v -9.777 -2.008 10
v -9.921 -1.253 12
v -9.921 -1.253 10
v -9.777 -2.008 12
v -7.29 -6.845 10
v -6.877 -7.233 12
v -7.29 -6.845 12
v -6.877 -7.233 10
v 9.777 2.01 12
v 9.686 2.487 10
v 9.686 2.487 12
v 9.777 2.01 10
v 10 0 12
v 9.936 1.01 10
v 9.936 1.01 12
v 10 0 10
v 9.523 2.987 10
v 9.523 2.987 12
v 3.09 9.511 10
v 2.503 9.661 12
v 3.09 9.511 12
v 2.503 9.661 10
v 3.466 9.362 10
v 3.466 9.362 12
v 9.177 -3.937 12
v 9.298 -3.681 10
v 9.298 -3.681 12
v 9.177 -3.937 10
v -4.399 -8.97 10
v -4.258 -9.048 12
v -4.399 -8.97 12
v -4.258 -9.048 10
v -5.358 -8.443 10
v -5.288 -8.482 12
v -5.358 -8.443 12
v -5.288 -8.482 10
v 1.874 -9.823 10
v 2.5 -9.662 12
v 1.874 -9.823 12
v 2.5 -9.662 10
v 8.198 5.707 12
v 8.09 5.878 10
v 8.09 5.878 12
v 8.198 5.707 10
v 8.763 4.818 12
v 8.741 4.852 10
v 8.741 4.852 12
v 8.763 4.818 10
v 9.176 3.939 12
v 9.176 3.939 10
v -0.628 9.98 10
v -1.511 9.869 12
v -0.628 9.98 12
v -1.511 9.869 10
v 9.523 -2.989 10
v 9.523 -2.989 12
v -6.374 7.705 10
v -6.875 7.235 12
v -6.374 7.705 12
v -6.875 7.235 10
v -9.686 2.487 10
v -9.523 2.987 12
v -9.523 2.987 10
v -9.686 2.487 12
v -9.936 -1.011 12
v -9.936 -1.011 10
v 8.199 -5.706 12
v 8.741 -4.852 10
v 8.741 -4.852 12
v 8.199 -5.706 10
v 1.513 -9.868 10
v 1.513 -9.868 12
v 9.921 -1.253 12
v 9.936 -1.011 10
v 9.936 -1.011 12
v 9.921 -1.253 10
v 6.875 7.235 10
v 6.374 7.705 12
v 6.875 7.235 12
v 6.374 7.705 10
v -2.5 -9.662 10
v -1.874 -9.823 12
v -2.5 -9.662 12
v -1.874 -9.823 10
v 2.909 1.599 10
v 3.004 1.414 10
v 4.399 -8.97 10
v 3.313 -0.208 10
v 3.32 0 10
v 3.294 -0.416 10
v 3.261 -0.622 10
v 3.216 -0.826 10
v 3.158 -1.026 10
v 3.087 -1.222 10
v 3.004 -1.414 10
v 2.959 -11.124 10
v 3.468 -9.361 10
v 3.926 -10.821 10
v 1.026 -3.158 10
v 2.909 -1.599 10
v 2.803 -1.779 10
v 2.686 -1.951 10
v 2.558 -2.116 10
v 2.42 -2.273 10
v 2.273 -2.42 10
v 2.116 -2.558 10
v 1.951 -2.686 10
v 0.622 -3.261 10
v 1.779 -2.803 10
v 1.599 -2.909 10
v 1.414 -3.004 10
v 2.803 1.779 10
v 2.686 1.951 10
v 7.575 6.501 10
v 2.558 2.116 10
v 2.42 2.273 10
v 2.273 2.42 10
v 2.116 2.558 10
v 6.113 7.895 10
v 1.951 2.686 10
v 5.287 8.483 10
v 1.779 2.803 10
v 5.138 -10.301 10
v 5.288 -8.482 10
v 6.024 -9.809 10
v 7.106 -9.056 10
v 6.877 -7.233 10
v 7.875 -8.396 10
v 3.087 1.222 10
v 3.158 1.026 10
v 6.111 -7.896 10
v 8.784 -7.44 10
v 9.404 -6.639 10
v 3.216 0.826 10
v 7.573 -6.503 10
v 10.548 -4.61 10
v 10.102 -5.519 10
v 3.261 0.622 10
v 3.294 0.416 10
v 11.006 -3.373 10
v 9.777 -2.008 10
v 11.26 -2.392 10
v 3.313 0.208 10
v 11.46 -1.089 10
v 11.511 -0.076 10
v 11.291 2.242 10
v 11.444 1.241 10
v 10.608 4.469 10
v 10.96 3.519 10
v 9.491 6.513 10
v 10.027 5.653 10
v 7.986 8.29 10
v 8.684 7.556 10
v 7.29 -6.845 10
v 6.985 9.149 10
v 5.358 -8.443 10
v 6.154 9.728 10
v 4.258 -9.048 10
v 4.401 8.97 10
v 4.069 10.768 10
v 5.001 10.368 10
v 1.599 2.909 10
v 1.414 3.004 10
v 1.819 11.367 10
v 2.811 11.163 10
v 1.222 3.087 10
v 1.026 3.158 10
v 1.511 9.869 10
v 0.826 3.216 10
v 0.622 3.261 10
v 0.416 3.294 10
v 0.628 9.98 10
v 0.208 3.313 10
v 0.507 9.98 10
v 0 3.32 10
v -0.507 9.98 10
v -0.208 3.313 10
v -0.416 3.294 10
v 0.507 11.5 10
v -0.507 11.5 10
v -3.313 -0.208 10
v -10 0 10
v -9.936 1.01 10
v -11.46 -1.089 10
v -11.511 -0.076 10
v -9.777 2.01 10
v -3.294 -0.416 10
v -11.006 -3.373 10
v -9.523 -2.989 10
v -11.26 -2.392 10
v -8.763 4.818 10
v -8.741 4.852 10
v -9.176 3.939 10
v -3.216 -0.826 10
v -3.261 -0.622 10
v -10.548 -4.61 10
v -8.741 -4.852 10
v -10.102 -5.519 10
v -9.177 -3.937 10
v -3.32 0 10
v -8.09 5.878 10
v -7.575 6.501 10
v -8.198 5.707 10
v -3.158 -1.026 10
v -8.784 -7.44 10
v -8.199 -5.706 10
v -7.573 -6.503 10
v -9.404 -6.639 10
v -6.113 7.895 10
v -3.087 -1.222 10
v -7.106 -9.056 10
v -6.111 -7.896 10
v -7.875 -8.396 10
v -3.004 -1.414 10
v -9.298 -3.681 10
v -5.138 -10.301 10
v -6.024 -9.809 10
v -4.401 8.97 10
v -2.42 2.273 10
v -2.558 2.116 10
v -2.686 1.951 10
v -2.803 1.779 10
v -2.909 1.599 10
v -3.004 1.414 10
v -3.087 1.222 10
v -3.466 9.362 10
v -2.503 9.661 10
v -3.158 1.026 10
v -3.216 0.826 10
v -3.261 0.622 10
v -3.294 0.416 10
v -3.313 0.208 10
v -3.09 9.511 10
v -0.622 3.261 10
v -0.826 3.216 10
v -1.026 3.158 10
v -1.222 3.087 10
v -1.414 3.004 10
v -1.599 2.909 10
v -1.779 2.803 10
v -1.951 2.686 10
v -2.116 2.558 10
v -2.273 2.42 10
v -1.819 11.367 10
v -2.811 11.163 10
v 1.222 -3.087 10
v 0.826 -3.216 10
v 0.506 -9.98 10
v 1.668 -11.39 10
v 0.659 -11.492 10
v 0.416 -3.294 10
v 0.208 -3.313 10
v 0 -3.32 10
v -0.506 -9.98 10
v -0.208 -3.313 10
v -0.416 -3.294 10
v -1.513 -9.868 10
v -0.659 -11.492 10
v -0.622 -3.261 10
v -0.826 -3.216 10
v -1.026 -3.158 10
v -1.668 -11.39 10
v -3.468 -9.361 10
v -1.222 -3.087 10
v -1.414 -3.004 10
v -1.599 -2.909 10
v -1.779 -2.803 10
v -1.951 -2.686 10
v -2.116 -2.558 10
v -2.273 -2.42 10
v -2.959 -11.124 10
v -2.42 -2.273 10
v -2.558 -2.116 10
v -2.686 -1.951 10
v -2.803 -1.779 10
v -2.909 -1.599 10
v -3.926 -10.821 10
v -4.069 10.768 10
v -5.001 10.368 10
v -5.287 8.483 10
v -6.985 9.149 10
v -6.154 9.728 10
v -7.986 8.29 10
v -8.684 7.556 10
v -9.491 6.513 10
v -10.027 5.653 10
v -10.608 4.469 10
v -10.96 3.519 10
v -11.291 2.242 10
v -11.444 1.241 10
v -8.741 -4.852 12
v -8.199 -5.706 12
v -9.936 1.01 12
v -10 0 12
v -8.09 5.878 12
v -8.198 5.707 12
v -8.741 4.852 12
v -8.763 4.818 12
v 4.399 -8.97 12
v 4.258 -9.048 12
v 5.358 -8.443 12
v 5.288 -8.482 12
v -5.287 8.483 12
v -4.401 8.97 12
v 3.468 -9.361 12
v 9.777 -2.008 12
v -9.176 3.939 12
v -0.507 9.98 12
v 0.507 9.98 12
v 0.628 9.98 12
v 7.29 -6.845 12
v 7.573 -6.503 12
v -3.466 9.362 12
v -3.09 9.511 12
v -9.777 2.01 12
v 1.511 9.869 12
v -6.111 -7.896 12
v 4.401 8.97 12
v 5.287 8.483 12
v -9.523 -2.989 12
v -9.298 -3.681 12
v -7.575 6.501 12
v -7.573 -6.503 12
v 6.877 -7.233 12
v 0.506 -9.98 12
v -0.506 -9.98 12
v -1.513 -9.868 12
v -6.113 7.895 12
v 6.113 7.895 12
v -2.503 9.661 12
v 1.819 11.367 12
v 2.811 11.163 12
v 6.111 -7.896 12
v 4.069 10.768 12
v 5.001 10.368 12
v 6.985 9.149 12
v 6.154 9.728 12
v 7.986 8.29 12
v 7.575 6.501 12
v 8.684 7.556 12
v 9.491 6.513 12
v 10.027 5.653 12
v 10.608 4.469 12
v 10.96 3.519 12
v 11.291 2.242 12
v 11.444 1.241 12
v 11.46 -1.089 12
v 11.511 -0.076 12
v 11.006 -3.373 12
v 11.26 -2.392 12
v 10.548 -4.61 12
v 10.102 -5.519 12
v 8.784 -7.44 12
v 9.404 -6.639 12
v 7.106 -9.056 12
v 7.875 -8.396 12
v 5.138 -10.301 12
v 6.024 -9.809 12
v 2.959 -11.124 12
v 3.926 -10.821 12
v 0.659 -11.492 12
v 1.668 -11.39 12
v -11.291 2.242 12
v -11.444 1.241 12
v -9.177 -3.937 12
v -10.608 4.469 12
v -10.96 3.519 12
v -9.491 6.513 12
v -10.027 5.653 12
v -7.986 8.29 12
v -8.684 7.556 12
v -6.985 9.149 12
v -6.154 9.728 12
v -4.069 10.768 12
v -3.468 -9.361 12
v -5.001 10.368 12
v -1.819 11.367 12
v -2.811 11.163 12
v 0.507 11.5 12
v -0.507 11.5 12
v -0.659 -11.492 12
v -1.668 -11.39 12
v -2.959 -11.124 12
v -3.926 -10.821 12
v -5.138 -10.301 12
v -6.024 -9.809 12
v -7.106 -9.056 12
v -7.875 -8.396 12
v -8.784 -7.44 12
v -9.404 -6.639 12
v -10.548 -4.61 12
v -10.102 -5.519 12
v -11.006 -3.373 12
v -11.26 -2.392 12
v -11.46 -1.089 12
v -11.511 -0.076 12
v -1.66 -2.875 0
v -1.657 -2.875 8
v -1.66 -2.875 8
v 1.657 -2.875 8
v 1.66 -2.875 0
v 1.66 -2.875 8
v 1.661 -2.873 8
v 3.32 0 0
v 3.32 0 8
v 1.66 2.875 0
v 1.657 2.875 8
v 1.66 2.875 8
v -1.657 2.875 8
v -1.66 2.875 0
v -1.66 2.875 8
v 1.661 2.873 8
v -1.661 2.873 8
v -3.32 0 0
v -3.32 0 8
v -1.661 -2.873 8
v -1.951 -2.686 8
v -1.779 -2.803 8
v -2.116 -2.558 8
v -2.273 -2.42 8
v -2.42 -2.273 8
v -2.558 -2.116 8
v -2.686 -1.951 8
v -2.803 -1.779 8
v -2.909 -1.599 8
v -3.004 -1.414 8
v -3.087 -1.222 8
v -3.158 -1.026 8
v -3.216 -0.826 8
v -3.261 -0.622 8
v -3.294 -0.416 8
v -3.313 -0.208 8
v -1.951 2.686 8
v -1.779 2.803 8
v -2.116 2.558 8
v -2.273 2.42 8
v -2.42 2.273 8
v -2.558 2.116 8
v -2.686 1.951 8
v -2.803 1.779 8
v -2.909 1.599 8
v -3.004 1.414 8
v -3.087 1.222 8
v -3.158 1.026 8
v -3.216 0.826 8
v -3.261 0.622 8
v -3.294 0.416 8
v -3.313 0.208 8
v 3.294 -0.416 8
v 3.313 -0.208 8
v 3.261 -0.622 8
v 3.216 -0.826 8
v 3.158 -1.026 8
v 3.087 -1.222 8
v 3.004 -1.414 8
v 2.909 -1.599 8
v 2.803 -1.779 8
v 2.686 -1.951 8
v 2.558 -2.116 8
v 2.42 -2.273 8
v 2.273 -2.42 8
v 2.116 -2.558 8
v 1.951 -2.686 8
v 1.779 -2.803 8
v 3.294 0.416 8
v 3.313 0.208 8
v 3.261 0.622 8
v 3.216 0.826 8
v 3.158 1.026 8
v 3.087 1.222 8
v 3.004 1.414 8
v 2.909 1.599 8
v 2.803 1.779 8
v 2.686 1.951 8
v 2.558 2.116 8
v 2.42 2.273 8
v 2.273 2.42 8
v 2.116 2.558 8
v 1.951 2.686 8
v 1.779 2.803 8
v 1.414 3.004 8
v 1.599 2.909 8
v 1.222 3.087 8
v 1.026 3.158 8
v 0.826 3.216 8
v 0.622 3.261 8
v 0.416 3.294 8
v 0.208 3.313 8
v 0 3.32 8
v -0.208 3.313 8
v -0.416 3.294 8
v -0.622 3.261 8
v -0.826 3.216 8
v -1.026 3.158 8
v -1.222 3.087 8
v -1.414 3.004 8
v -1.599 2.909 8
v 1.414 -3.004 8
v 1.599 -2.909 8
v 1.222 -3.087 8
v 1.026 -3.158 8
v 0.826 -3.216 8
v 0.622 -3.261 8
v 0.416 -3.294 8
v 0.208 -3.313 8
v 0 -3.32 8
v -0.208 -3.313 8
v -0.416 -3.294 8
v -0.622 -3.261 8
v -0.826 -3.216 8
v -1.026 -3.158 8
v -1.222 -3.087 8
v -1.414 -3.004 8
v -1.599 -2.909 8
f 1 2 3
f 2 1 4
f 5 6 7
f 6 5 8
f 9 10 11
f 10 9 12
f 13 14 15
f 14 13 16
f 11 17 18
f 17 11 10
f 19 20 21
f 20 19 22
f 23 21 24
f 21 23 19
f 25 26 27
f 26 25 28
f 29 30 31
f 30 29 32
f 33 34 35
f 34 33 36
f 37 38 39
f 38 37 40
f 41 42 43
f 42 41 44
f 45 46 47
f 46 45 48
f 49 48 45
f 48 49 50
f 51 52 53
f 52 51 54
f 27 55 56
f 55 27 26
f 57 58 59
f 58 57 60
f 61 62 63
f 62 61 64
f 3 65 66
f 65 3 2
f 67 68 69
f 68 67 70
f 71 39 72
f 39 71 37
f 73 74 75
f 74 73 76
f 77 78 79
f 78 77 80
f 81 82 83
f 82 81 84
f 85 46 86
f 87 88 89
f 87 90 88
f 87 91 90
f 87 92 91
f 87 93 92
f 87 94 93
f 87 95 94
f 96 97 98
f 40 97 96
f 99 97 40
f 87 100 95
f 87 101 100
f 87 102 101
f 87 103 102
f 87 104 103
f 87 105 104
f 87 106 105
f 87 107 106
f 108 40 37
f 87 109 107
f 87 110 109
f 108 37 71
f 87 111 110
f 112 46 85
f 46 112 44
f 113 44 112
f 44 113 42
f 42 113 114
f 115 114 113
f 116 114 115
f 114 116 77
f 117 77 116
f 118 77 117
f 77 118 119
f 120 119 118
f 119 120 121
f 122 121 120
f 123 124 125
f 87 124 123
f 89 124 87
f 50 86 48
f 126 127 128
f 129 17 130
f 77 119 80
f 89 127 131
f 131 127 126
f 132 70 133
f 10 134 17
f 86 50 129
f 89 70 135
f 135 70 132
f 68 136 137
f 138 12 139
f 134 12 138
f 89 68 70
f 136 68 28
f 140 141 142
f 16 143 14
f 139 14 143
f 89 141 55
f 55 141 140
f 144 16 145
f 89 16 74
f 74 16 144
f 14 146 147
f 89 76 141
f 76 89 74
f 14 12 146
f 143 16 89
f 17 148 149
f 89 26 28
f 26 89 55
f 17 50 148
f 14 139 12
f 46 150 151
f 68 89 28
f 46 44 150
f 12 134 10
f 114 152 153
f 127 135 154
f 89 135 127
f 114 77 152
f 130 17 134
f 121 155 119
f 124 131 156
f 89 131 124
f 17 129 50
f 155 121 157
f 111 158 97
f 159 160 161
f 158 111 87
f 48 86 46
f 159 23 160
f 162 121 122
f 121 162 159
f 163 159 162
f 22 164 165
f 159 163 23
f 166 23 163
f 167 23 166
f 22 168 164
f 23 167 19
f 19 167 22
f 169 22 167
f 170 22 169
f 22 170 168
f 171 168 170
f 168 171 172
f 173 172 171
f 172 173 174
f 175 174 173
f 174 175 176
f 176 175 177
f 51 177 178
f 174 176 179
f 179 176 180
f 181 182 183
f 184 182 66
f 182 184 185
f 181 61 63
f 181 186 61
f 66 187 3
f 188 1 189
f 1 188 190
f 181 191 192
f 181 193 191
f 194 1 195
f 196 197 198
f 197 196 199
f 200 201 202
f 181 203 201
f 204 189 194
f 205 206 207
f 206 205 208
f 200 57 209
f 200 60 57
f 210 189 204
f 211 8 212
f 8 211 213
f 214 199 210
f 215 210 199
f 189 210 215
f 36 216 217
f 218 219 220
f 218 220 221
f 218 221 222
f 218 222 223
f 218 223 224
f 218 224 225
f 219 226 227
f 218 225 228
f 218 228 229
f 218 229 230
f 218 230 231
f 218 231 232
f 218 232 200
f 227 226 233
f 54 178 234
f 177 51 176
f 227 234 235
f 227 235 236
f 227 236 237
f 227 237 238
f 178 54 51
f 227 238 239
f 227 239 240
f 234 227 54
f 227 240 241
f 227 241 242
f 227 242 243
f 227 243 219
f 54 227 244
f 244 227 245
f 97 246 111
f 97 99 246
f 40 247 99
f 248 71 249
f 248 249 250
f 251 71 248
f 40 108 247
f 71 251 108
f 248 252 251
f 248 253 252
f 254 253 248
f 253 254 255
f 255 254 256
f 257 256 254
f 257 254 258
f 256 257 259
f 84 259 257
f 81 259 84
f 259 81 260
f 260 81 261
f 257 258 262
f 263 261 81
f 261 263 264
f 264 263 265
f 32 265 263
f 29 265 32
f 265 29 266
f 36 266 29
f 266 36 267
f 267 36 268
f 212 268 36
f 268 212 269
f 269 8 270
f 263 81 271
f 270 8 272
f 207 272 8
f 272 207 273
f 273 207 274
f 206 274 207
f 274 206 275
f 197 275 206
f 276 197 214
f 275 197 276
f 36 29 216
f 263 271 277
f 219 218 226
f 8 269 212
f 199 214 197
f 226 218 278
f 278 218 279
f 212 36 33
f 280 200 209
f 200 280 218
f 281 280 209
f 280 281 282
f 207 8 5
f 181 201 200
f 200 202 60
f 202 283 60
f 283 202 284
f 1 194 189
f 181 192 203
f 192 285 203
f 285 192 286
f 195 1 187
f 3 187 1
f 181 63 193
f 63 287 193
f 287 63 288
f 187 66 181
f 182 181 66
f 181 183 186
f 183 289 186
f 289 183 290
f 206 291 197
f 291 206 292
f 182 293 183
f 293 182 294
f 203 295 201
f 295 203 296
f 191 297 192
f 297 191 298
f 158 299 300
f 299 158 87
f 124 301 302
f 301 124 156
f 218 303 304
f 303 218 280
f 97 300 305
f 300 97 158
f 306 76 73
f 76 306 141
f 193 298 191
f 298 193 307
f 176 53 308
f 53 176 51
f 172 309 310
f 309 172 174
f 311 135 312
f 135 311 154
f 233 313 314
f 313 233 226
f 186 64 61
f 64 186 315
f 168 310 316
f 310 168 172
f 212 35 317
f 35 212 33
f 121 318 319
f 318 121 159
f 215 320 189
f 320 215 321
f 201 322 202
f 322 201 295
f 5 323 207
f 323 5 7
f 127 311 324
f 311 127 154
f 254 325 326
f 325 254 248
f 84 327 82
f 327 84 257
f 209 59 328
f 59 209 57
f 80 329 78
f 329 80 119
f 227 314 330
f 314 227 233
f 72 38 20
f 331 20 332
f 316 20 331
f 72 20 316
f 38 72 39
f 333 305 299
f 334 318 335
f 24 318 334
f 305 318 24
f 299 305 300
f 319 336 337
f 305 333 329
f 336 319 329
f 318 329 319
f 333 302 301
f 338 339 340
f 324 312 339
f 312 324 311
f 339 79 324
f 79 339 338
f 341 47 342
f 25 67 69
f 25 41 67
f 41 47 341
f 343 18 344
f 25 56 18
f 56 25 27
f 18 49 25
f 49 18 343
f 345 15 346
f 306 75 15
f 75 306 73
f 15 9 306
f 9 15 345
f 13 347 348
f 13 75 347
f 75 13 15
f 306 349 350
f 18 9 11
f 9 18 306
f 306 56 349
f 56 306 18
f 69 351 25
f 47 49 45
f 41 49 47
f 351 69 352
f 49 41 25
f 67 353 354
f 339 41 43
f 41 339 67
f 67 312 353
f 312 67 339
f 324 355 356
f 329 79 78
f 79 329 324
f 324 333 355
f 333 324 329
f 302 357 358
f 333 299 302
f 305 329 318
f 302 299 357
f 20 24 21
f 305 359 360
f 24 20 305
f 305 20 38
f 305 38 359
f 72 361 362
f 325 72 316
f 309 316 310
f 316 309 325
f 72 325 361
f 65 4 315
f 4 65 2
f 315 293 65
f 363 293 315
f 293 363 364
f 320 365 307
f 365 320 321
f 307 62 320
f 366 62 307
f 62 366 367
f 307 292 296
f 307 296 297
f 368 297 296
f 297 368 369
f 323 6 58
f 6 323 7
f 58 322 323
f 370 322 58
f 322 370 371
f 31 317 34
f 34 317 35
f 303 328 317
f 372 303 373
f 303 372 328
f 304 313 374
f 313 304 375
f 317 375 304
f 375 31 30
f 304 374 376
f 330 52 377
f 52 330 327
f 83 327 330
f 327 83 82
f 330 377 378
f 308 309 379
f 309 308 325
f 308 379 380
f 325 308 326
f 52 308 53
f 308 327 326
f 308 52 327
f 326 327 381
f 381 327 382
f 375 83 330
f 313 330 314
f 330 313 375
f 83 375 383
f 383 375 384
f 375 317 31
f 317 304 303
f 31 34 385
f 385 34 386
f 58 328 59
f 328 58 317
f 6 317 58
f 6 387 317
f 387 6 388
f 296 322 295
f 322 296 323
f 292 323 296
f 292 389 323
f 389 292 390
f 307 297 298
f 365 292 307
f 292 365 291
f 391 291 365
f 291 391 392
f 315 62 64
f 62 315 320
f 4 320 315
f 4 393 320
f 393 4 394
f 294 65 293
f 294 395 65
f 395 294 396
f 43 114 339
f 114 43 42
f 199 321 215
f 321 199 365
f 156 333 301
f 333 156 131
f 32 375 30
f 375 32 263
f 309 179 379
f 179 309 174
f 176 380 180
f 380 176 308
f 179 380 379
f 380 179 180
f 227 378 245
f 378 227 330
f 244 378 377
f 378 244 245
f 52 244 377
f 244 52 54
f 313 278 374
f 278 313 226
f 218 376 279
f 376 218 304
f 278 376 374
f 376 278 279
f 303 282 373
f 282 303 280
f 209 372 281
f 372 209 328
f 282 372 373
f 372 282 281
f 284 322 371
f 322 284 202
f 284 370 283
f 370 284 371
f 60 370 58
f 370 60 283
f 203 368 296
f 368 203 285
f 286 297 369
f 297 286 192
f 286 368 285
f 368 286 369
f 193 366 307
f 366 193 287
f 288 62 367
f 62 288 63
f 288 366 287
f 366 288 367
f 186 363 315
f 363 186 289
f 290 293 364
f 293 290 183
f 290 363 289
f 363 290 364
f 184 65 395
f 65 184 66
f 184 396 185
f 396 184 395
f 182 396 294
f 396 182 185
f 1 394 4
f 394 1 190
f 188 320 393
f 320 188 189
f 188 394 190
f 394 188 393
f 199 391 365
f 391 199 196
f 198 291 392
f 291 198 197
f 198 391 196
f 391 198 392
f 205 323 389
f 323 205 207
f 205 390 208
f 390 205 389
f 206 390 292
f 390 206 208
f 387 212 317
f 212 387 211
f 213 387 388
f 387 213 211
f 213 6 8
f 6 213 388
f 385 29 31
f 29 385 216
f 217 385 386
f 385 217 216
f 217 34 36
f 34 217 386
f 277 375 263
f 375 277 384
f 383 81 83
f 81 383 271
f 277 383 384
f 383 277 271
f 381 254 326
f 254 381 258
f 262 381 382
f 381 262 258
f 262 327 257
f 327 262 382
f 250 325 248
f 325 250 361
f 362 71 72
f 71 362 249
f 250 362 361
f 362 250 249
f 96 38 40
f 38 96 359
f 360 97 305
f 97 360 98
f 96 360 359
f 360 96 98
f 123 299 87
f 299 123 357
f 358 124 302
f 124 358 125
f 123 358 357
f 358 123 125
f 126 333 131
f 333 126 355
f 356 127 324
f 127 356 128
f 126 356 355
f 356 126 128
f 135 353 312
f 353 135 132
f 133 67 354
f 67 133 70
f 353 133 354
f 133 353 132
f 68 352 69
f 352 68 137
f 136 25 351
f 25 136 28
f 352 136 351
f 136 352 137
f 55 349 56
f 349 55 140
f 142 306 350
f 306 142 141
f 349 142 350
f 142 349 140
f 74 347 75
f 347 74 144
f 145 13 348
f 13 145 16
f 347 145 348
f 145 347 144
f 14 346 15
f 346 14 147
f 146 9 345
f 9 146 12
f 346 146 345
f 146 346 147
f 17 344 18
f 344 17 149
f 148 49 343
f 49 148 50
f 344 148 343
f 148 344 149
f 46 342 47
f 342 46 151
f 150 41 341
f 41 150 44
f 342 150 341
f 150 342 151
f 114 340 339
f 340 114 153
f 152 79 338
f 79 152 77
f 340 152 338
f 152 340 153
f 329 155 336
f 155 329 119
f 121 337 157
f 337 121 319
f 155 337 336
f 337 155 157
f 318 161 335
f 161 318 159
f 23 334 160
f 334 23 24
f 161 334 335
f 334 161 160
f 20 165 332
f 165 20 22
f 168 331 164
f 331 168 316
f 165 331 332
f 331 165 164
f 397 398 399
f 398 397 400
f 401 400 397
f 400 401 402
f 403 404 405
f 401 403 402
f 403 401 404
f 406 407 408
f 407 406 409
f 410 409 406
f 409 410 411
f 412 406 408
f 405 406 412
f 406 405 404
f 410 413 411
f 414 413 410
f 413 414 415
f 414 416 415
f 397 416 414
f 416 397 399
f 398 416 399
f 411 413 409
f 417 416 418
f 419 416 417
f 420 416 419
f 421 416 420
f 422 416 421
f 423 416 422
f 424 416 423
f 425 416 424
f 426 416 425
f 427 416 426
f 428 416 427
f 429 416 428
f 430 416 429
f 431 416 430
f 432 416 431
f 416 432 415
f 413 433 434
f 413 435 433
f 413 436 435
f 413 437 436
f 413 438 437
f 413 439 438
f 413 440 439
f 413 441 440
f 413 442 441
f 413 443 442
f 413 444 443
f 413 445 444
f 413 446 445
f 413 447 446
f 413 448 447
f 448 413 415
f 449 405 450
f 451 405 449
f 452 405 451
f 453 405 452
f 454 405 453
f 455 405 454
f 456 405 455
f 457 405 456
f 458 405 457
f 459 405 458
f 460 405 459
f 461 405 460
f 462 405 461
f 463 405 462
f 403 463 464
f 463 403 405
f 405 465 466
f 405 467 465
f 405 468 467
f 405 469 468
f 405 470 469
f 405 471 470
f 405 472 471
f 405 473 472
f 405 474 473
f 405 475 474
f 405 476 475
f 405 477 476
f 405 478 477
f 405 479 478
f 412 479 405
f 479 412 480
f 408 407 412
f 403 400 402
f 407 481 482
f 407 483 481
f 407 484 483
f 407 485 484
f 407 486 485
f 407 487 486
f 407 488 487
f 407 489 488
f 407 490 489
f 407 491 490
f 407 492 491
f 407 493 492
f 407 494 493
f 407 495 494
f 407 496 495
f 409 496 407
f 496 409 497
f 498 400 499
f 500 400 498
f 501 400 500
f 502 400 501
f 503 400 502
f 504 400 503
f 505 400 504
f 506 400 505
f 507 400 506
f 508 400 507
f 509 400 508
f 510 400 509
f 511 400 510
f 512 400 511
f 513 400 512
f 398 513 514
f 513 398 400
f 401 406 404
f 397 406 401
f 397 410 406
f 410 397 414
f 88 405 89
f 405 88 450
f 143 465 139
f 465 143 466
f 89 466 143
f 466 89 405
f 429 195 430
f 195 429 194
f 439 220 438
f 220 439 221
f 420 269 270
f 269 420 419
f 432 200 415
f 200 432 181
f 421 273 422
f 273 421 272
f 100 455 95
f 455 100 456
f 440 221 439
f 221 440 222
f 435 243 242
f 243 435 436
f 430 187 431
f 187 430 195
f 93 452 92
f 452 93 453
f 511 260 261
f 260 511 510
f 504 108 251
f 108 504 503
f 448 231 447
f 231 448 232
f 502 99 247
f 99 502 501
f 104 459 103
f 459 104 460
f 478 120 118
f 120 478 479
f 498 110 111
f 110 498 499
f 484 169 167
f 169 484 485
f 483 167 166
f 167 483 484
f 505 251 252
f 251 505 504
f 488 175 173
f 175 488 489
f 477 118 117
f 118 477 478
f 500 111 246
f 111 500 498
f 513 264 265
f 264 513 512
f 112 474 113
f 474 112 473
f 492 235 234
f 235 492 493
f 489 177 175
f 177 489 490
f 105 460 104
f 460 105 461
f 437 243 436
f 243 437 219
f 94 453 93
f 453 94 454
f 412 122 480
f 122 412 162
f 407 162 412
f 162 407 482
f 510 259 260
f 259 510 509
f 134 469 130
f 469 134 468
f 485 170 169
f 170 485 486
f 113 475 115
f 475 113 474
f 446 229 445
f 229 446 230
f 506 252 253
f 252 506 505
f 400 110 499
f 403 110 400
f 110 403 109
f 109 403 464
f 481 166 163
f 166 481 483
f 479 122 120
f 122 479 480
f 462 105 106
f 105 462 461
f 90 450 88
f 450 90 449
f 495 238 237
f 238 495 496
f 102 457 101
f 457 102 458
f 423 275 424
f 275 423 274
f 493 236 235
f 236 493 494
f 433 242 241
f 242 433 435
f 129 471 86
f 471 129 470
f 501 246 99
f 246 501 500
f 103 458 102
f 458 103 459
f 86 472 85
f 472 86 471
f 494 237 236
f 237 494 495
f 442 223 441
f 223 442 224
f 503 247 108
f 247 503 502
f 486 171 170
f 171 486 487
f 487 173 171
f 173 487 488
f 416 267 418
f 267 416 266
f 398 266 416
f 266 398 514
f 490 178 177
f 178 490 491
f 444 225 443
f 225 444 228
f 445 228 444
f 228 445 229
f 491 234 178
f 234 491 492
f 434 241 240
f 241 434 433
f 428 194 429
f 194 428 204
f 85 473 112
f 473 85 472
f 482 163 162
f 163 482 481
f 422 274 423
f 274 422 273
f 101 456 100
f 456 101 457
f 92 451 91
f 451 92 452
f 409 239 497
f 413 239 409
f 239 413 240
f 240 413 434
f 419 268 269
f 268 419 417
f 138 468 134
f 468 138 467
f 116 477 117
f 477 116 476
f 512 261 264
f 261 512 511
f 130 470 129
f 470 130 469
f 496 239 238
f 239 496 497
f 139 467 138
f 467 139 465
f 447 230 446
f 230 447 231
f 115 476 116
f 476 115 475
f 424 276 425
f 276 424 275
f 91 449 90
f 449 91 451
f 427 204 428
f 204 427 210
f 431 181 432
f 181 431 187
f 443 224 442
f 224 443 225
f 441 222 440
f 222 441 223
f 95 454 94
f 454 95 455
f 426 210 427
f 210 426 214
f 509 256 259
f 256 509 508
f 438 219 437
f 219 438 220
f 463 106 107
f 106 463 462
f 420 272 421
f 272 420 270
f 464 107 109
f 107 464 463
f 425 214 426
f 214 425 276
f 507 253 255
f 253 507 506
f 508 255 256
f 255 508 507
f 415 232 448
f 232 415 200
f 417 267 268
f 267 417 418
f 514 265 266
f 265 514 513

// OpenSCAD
// file: MetalGear.scad
/** Created by Jose Araujo. 2014-06-06
	Simple gear (like the ones coming in hobby
	metal motors).
*/
pi = 3.1415926535897932384626433;

module Gear ( 
			shaft // center shaft radio
			, h  // length of shaft
			, gr //gear radio
			, nt //number of tooth. 
			, td //teeth depth.			
			, hollow_shaft // indicates if the shaft is solid or if it a holow
			, ringr // the radius of the ring that holds the tooth together
) {
c = 2*pi *ringr; // circumference of ring

if ( hollow_shaft == 0 )  
    cylinder ( h= h, r= shaft , $fn= 50 );

//  ring for tooth.
difference (){
    cylinder( h= h, r= ringr, $fn = 50 ) ;
    cylinder( h = h, r=shaft, $fn = 50 ) ;
}

// tooth
for ( i= [0: (nt -1)] ){	
	
	//translate ( [-sin( a)* shaft,cos(a) *shaft,0])
	rotate( [0,0, i*360/nt]) 
	translate ( [-c/(nt*2)/2, shaft,0])
	cube (size=[c/(nt*2),gr-shaft, h]);
/*	translate ( [-td/2, shaft,0])
	cube (size=[td,gr-shaft, h]);*/
}
}


Gear ( shaft= 0.95,  // center shaft radio
			h = 5, // lenght of shaft
	gr = 2.5 , //gear radio
nt = 8, //number of tooth. 
td = 0.5, //teeth depth.
hollow_shaft = 1, // indicates if the shaft is solid or if it a holow
ringr = 1 // the radius of the ring that holds the tooth together
) ;
// file: Hex.scad
/** Created by Jose Araujo. 2014-6-7.

    Just standard hex key (parametric) with no handle; 
*/


module Hex(
				radius // radius in mm
				, h // height of hex
		 ){
cylinder ( r= radius, h =h, $fn = 6 ) ;
}

Hex(radius = 5,h  = 25);
// main file
use <Hex.scad>
use <MetalGear.scad>



Hex ( radius = 3.32, h = 8) ; 
translate ( [0,0,8])
cylinder (r=3.32,h =2 , $fn= 100); 
translate ( [0,0,10])
Gear (  shaft= 0.95,  // center shaft radio
			h = 2, // lenght of shaft
	gr = 11.5 , //gear radio
nt = 31, //number of tooth. 
td = 1, //teeth depth.
hollow_shaft = 0, // indicates if the shaft is solid or if it a holow
ringr = 10 // the radius of the ring that holds the tooth together
);
/*Gear (  shaft= 0.95,  // center shaft radio
			h = 5, // lenght of shaft
	gr = 2.5 , //gear radio
nt = 8, //number of tooth. 
td = 1, //teeth depth.
hollow_shaft = 0, // indicates if the shaft is solid or if it a holow
ringr = 1.2 // the radius of the ring that holds the tooth together
);*/
